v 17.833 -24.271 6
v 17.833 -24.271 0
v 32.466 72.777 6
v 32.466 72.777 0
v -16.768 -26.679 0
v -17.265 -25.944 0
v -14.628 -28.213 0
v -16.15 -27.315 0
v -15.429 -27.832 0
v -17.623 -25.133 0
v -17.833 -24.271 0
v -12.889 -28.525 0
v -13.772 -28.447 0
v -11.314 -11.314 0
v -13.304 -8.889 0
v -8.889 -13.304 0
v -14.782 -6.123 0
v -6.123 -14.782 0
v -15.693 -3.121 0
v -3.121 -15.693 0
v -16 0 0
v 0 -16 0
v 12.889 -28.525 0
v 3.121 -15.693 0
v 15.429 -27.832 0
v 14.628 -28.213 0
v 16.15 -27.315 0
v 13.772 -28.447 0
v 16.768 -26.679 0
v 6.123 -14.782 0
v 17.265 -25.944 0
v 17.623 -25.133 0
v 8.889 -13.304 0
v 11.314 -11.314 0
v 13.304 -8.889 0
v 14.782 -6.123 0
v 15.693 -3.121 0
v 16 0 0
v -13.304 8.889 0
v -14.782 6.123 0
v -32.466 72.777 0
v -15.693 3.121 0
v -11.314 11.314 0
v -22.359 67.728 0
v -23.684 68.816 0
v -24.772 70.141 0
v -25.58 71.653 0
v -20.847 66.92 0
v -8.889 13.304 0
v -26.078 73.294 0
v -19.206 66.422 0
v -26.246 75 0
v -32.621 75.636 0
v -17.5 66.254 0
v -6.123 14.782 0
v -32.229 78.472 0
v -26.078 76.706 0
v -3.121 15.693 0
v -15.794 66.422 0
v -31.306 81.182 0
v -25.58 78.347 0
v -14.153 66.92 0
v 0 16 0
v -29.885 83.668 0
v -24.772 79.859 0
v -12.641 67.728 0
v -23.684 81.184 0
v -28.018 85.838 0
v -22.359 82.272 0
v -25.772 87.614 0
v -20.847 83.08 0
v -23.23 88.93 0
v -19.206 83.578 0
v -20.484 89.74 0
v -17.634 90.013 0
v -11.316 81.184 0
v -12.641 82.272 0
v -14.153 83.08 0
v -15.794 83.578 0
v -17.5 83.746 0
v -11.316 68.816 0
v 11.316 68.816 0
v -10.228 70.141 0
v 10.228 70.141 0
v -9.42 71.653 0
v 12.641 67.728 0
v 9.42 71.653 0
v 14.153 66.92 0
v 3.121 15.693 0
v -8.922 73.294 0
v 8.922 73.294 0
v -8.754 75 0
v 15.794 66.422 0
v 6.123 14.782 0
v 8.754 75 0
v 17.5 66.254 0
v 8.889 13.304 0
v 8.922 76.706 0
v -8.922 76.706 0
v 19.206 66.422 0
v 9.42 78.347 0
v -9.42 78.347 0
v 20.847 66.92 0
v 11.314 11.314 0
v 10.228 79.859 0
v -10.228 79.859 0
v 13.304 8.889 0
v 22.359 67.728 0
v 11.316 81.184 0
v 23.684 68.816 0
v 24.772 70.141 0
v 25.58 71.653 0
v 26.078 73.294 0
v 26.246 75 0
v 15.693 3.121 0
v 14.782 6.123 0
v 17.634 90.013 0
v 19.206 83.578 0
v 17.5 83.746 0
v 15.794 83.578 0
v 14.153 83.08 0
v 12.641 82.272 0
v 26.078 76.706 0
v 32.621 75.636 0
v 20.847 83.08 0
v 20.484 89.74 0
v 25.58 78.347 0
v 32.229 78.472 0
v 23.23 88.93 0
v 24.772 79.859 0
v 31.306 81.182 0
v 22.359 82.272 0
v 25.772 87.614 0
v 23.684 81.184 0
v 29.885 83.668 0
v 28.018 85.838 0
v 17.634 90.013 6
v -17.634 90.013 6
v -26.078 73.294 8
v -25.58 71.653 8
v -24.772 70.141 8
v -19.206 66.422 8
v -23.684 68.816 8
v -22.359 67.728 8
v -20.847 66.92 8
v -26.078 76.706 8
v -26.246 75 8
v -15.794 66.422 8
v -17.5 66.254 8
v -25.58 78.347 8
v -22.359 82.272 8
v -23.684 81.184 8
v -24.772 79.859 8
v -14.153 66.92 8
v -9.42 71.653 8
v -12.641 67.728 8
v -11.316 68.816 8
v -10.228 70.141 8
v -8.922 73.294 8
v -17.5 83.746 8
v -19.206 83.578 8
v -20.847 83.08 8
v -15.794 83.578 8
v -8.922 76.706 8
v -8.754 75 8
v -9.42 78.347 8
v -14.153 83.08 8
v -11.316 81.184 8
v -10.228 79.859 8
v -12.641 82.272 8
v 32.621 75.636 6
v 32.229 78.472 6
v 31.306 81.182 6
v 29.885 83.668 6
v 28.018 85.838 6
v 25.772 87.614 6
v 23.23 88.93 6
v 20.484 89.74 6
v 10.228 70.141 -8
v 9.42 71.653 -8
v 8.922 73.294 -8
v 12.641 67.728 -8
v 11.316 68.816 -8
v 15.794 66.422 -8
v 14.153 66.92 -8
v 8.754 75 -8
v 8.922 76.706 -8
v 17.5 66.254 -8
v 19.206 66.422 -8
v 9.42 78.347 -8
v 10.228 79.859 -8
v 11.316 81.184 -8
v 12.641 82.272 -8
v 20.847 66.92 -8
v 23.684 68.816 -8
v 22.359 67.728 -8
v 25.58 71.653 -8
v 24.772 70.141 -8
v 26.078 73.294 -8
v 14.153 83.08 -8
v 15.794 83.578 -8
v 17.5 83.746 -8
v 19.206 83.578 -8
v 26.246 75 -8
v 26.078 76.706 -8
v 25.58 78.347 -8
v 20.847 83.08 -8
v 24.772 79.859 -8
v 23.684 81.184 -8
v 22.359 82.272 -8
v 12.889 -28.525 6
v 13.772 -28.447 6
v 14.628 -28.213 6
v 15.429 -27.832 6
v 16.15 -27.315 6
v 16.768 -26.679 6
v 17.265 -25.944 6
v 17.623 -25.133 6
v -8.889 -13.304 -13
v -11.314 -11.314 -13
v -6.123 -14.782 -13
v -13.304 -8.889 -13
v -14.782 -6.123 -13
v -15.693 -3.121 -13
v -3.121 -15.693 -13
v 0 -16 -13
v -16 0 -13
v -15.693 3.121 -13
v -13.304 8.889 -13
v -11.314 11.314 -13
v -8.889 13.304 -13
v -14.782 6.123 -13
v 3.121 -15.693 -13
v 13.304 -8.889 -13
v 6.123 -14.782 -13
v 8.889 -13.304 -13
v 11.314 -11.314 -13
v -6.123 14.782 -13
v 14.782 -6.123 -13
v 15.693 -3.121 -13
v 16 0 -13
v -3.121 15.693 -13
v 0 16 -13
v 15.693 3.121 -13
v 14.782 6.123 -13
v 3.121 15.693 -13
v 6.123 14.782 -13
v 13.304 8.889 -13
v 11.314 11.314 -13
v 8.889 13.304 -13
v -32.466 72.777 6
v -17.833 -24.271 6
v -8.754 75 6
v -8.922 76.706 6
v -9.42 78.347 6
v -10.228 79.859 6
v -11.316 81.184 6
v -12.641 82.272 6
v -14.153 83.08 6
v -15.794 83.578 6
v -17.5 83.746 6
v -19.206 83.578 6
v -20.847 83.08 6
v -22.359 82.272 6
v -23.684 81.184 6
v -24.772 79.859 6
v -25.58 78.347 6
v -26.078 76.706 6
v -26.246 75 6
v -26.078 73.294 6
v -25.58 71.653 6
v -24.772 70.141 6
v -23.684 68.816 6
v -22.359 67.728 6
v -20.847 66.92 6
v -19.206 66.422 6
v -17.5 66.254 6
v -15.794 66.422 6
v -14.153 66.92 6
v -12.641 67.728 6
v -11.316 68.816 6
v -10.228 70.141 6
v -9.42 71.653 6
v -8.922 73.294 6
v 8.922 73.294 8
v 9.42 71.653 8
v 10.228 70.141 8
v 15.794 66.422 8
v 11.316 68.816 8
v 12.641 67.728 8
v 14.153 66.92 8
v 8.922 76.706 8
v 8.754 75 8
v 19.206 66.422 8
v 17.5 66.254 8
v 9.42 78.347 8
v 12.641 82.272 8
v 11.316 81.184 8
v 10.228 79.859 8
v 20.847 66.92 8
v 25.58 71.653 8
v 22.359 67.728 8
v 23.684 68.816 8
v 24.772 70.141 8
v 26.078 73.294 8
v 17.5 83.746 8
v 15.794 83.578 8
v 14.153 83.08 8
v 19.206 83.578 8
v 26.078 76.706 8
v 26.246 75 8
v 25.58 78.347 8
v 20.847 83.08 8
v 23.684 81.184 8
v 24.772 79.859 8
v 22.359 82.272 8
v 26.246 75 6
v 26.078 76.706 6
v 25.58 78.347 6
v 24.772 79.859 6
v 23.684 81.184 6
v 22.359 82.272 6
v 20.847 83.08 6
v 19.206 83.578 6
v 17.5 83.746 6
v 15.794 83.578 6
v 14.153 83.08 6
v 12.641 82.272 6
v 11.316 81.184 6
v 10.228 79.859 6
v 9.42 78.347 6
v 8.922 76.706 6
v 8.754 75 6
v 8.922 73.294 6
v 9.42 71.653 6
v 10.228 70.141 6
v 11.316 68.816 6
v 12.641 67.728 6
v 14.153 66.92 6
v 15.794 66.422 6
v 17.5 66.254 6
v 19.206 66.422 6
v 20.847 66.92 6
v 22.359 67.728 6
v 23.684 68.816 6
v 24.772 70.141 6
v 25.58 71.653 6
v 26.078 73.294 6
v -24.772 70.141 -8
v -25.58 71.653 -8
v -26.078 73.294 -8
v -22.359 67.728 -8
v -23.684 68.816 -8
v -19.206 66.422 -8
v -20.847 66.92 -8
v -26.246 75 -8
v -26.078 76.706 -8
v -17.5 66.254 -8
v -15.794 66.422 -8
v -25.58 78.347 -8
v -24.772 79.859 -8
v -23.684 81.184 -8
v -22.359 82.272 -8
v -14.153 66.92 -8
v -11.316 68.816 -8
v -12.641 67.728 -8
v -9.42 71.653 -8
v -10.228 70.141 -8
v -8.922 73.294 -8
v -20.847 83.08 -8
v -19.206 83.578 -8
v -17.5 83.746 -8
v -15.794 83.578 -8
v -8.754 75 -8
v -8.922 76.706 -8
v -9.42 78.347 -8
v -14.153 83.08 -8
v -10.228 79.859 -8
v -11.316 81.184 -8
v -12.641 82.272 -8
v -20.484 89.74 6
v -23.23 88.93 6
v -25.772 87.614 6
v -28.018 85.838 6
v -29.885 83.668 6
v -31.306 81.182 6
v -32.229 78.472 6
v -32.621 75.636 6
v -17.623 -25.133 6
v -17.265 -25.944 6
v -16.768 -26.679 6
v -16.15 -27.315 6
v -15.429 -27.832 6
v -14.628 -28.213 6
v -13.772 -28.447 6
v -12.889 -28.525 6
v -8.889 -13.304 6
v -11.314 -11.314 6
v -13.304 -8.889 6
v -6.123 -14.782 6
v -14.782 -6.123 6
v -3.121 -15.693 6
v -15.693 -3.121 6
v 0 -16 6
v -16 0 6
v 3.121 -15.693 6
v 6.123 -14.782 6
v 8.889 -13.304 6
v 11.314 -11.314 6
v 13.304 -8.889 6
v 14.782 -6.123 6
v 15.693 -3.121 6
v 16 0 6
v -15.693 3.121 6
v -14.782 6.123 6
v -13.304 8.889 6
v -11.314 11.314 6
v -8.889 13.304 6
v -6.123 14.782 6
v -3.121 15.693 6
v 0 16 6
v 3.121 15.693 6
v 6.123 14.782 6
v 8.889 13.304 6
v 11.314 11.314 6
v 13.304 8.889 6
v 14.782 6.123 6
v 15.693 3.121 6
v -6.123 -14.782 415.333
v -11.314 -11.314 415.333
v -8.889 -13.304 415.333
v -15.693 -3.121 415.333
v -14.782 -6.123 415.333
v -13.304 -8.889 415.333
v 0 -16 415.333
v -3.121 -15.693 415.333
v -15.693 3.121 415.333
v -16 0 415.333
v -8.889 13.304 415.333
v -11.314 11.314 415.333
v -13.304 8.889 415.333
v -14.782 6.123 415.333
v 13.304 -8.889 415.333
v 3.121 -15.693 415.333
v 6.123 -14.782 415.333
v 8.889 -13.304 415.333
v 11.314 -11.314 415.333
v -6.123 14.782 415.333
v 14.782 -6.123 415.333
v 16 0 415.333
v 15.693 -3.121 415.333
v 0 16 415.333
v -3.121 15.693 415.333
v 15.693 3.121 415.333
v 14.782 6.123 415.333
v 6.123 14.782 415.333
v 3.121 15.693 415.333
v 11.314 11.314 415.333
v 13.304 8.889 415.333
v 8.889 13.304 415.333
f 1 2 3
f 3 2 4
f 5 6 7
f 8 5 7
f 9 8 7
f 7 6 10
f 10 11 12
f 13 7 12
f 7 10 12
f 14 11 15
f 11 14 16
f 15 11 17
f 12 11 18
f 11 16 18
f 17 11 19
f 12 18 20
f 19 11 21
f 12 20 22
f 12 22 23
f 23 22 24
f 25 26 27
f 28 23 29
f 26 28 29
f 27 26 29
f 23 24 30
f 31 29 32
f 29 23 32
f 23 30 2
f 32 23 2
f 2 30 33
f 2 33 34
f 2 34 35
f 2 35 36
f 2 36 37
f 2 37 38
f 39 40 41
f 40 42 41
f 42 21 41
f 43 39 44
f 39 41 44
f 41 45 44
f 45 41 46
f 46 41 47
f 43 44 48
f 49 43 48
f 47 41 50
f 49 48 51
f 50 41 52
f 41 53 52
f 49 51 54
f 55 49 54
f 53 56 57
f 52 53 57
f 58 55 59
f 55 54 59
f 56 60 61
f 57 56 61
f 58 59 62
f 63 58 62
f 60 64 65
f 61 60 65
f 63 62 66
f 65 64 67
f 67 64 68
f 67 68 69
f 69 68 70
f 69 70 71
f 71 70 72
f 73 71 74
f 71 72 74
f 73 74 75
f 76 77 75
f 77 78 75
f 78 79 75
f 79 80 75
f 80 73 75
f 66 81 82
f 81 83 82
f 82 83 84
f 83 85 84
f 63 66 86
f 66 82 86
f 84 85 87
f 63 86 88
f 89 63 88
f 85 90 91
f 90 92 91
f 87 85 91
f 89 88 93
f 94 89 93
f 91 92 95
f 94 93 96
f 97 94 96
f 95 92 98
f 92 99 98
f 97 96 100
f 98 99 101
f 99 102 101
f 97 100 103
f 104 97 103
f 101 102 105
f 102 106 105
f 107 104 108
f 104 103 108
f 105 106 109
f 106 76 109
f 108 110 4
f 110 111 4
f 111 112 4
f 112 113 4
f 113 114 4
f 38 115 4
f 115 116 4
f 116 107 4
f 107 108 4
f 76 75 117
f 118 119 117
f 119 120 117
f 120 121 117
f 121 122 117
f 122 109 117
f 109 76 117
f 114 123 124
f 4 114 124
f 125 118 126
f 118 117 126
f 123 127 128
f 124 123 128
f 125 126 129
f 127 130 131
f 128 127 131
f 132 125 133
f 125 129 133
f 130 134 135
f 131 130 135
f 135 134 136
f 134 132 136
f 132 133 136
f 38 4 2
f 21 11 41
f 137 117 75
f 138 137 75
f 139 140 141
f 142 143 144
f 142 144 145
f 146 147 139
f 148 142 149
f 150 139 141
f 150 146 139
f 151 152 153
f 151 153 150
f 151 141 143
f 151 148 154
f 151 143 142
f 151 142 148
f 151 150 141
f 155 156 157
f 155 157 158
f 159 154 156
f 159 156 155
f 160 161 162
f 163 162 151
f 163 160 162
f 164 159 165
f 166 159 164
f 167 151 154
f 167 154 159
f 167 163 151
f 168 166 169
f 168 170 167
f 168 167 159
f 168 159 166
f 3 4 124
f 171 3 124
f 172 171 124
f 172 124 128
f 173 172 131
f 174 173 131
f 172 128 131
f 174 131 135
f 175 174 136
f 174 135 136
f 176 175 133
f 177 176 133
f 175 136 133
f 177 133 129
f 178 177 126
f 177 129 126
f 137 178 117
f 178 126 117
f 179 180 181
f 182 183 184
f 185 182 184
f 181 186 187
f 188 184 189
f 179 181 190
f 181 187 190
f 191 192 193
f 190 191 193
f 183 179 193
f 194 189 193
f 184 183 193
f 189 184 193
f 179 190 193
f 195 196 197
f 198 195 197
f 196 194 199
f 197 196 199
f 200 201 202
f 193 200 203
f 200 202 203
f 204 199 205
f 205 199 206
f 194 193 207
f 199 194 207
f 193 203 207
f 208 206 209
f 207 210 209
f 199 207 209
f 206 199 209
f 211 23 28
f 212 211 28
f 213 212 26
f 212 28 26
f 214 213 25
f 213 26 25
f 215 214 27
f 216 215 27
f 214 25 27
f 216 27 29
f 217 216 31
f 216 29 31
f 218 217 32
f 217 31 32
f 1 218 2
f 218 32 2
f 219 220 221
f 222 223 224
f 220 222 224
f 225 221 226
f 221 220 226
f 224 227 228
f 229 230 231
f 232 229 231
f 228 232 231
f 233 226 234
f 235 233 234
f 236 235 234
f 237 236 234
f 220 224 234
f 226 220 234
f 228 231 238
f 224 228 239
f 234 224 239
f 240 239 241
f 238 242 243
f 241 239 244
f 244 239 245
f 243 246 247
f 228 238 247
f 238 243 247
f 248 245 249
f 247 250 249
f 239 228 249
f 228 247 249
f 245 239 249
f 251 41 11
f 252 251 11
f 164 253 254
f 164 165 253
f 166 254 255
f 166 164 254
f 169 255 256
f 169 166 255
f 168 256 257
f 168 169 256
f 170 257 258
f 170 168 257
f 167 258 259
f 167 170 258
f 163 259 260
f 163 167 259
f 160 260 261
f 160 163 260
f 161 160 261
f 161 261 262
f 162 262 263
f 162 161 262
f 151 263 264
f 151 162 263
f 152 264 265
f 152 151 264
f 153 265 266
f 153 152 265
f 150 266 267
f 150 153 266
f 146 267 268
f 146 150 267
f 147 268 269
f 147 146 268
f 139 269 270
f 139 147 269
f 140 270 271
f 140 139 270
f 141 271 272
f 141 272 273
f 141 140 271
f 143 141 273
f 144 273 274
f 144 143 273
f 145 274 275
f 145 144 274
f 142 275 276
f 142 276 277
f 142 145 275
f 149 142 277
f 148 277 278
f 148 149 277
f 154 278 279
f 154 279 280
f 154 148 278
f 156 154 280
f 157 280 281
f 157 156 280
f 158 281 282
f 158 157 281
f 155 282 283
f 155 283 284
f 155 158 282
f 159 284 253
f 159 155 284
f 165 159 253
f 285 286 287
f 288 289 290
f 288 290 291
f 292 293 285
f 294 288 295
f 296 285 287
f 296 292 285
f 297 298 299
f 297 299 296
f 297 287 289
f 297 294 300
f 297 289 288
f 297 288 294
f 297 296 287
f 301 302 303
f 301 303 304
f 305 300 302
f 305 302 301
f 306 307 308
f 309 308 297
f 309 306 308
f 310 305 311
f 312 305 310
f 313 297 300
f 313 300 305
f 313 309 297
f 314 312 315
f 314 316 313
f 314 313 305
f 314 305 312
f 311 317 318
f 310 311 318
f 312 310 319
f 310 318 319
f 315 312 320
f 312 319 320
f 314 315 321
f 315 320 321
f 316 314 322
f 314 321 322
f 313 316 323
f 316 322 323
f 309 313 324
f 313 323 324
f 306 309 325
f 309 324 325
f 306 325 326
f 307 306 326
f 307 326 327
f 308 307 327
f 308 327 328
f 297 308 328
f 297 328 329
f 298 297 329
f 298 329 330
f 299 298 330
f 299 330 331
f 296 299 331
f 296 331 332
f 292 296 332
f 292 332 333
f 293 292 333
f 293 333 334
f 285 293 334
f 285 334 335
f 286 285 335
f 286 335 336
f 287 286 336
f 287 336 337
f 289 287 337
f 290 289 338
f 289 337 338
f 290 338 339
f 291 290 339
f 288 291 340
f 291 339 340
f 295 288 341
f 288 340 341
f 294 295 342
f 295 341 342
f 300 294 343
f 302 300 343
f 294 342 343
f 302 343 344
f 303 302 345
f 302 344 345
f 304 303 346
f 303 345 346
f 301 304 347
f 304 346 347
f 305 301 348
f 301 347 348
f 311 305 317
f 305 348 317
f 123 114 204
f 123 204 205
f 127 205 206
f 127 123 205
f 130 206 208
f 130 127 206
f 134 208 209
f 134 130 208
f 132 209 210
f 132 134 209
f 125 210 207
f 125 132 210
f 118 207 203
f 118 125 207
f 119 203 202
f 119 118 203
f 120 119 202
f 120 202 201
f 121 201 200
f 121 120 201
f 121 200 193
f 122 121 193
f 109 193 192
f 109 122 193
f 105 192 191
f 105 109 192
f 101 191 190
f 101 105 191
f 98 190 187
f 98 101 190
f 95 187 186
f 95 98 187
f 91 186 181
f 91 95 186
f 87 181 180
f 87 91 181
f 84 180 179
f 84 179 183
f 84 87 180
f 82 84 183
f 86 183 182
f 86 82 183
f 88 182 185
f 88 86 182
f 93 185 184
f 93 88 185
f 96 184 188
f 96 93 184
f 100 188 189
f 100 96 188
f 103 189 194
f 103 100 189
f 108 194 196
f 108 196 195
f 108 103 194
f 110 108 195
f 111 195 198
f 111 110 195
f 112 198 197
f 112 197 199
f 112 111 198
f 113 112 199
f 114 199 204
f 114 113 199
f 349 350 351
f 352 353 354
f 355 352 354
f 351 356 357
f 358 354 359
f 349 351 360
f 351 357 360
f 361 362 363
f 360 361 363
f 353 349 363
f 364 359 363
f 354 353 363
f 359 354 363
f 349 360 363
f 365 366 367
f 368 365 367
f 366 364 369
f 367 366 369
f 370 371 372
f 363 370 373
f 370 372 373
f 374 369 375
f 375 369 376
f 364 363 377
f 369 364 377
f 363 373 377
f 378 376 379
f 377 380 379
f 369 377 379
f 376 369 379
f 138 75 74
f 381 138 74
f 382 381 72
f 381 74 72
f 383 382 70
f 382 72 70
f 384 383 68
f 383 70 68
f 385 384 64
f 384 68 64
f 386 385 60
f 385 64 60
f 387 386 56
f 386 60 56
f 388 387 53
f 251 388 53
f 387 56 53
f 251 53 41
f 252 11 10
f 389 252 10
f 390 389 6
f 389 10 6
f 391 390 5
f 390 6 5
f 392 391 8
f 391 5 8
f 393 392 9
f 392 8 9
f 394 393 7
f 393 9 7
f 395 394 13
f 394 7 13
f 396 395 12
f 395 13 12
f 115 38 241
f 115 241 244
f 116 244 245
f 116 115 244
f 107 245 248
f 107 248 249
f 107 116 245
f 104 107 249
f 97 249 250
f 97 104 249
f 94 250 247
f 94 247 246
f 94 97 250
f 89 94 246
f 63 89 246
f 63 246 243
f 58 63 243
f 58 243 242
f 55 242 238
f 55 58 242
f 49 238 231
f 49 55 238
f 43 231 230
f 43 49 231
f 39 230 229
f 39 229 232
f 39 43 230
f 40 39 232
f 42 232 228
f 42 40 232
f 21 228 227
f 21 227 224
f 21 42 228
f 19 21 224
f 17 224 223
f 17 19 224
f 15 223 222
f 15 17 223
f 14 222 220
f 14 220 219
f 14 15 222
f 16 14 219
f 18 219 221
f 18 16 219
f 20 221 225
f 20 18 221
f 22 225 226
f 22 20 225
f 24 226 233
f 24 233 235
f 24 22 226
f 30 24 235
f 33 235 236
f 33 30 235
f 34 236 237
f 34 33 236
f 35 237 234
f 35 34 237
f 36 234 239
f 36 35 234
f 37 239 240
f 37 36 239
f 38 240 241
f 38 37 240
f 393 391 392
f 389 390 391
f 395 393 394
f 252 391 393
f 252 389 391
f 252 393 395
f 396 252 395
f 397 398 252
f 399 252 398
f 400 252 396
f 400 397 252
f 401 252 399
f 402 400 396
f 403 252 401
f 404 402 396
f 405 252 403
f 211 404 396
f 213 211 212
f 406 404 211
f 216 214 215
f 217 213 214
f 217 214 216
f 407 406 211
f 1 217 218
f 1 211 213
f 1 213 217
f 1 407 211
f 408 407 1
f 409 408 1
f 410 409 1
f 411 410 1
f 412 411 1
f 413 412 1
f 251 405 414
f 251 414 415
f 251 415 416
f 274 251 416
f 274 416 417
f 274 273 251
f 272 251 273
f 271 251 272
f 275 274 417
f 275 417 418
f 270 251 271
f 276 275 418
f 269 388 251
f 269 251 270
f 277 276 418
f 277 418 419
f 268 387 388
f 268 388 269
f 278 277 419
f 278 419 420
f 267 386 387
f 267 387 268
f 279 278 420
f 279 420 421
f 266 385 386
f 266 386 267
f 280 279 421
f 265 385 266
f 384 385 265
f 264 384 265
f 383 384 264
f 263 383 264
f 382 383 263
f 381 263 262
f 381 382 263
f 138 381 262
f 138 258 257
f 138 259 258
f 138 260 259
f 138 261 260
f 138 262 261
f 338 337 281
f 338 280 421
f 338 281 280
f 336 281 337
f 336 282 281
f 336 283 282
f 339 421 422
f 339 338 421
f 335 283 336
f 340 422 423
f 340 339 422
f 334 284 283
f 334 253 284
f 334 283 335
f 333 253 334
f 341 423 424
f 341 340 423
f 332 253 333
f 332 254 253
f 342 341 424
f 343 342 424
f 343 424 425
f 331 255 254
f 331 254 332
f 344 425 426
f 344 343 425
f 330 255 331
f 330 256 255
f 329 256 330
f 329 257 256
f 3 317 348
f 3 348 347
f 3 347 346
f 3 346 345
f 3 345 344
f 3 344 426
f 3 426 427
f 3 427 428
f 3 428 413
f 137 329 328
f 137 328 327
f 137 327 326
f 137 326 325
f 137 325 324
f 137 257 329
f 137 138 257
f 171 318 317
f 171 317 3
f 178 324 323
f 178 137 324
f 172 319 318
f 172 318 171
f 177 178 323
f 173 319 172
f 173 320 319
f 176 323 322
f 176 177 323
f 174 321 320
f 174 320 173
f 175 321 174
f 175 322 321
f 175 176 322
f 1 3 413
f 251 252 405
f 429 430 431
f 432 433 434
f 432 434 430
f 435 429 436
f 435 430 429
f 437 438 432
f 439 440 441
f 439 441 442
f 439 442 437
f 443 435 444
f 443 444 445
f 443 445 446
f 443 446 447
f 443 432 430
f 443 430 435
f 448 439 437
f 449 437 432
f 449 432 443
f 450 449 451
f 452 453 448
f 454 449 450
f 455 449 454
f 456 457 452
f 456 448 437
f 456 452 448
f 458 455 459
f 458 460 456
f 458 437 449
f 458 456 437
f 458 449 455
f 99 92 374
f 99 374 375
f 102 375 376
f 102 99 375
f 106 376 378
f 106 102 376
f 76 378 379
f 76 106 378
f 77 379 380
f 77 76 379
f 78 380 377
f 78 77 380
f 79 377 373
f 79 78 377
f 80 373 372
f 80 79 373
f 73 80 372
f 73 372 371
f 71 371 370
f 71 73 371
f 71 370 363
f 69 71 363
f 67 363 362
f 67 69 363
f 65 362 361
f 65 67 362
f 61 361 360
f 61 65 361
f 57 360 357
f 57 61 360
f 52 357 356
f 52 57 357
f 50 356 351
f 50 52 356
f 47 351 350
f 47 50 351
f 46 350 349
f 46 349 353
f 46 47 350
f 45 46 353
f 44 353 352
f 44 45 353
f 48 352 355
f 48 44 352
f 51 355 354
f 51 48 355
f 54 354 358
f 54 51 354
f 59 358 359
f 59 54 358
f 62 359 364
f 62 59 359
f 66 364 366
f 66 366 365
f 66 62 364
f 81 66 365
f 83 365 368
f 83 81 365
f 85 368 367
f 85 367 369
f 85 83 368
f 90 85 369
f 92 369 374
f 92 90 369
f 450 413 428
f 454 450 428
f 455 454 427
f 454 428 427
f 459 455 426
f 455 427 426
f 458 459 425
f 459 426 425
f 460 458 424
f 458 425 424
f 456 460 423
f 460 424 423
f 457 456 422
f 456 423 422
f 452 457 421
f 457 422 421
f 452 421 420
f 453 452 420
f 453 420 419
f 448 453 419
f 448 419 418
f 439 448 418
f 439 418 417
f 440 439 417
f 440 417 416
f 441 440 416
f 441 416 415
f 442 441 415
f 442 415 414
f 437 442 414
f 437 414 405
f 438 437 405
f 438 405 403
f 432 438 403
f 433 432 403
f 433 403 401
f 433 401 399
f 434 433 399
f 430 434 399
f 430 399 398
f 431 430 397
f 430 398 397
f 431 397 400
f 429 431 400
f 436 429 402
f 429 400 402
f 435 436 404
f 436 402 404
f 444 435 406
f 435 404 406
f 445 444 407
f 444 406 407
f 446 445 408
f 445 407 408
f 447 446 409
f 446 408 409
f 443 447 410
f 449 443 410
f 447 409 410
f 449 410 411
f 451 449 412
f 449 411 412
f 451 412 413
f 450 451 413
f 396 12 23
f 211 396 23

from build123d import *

# Parameters (mm, degrees)
F2_DEPTH = 6
F0_R     = 16
F3_DEPTH = 415.3325557709
F0_R_2   = 8.745861022
F4_DEPTH = 8
F5_DEPTH = 13


with BuildPart() as f2:
    # F1 (on Top) → F2 (new body)
    with BuildSketch(Plane.XY):
        with BuildLine():
            Line((-12.8886751705, -28.5254933068), (0, -28.5254933068))
            Line((0, -28.5254933068), (12.8886751705, -28.5254933068))
            ThreePointArc((12.8886751705, -28.5254933068), (16.1500065629, -27.3154428512), (17.8327877404, -24.2709803264))
            Line((17.8327877404, -24.2709803264), (32.4659266708, 72.7768343533))
            ThreePointArc((32.4659266708, 72.7768343533), (29.0034375943, 84.7972895893), (17.6335889612, 90.0132954121))
            Line((17.6335889612, 90.0132954121), (0, 90.0132954121))
            Line((0, 90.0132954121), (-17.6335889612, 90.0132954121))
            ThreePointArc((-17.6335889612, 90.0132954121), (-29.0034375943, 84.7972895893), (-32.4659266708, 72.7768343533))
            Line((-32.4659266708, 72.7768343533), (-17.8327877404, -24.2709803264))
            ThreePointArc((-17.8327877404, -24.2709803264), (-16.1500065629, -27.3154428512), (-12.8886751705, -28.5254933068))
        make_face()
    extrude(amount=F2_DEPTH)

    # F0 (on Top) → F3 (join)
    with BuildSketch(Plane.XY):
        Circle(F0_R)
    extrude(amount=F3_DEPTH)

    # F0 (on Top) → F4 (join, symmetric)
    with BuildSketch(Plane.XY):
        with Locations((17.5, 75)):
            Circle(F0_R_2)
        with Locations((-17.5, 75)):
            Circle(F0_R_2)
    extrude(amount=F4_DEPTH, both=True)

    # F0 (on Top) → F5 (join)
    with BuildSketch(Plane.XY):
        Circle(F0_R)
    extrude(amount=-F5_DEPTH)


solid = f2.part
